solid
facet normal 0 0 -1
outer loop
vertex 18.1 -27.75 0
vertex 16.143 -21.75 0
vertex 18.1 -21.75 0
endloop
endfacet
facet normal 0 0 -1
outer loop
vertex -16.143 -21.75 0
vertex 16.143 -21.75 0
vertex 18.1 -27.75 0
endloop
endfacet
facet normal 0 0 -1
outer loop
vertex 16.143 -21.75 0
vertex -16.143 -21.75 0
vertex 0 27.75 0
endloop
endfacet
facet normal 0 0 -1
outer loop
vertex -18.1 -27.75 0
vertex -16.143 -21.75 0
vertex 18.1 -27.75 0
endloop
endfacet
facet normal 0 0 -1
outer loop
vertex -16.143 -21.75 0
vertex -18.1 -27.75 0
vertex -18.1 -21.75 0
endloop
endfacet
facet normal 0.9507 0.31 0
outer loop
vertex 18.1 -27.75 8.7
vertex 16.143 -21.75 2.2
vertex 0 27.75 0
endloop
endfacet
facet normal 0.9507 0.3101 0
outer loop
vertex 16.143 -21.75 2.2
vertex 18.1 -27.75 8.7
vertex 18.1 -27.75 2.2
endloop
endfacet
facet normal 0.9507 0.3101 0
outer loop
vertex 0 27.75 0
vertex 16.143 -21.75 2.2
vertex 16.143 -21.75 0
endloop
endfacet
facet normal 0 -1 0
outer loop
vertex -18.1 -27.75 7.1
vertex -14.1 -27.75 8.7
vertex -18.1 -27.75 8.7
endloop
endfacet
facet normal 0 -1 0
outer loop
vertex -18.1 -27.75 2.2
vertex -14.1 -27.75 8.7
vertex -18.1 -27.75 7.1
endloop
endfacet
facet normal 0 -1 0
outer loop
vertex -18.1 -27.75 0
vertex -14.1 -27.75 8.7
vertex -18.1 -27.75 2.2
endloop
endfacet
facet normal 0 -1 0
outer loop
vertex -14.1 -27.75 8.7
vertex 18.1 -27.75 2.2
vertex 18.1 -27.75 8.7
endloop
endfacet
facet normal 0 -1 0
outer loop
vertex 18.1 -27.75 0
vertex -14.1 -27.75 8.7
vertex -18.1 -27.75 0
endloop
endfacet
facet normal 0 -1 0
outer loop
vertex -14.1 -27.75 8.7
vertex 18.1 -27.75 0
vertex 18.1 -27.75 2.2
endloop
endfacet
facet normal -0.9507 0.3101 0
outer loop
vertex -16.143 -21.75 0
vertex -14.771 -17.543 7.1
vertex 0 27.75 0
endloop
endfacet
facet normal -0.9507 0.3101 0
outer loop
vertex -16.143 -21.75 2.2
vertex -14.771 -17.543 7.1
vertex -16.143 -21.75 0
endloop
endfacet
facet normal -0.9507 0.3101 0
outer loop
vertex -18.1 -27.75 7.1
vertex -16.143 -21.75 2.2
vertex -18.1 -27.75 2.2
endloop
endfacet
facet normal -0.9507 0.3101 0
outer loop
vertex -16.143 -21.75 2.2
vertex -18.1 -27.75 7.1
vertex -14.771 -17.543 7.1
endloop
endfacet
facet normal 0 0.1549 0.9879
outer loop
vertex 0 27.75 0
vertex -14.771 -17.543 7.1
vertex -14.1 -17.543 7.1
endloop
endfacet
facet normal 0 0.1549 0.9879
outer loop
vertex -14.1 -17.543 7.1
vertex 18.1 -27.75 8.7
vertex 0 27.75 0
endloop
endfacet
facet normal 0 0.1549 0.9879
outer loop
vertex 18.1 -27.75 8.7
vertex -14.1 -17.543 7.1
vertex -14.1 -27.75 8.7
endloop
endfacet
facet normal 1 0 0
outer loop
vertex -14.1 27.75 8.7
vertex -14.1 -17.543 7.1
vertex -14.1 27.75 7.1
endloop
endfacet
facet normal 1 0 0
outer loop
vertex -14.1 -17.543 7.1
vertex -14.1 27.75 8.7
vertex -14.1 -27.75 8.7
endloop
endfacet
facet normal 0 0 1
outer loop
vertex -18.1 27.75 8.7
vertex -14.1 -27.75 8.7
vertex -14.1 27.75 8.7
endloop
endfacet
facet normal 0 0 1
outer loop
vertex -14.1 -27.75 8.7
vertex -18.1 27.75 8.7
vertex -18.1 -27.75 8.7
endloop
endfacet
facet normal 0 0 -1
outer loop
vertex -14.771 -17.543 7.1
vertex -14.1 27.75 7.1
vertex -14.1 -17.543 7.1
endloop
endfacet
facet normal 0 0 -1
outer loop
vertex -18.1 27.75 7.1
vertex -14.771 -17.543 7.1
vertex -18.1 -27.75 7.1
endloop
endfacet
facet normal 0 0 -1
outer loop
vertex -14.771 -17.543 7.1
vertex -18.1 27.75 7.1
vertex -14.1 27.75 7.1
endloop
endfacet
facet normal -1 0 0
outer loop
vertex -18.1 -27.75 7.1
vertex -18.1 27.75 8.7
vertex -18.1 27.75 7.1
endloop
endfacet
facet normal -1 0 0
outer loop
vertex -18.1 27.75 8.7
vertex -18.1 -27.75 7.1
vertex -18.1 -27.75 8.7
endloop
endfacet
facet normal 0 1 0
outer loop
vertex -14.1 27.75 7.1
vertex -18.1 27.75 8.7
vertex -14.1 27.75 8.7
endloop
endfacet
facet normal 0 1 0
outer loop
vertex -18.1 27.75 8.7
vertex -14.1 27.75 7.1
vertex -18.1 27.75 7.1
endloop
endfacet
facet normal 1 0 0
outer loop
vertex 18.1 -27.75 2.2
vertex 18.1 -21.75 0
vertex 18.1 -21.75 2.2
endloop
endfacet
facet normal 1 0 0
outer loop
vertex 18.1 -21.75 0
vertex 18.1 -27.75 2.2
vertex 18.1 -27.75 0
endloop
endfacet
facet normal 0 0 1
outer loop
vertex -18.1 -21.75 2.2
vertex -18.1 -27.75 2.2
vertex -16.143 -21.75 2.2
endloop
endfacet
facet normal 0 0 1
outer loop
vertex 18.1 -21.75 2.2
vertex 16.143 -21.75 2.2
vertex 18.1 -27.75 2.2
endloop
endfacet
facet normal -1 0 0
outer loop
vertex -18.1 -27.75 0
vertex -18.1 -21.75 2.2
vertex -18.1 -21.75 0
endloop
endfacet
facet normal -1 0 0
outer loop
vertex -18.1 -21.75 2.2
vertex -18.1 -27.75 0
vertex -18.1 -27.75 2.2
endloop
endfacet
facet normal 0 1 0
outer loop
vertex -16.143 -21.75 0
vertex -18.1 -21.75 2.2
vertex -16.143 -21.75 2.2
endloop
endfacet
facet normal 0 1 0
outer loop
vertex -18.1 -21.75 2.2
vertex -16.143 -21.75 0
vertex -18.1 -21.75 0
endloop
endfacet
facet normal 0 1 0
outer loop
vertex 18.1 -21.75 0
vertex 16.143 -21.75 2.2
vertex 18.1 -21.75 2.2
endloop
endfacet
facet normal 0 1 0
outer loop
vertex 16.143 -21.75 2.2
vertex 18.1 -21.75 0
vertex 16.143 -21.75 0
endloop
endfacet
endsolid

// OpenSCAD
$fn=64;

L = 55.5;
W = 36.2;
H = 8.7;

step_w = 4.0;
step_h = 1.6;

end_lip_len = 6.0;
end_lip_h = 2.2;

module tapered_wedge(len=L, width=W, height=H){
    polyhedron(
        points=[
            [-width/2, -len/2, 0],
            [ width/2, -len/2, 0],
            [ 0,        len/2, 0],
            [-width/2, -len/2, height],
            [ width/2, -len/2, height],
            [ 0,        len/2, 0]
        ],
        faces=[
            [0,1,2],
            [3,5,4],
            [0,2,5,3],
            [1,4,5,2],
            [0,3,4,1]
        ],
        convexity=10
    );
}

module side_step(len=L, width=W, height=H, sw=step_w, sh=step_h){
    translate([-(width/2 - sw/2), 0, height - sh/2])
        cube([sw, len, sh], center=true);
}

module end_lip(width=W, len=L, lip_len=end_lip_len, lip_h=end_lip_h){
    translate([0, -len/2 + lip_len/2, lip_h/2])
        cube([width, lip_len, lip_h], center=true);
}

union(){
    tapered_wedge();
    side_step();
    end_lip();
}
